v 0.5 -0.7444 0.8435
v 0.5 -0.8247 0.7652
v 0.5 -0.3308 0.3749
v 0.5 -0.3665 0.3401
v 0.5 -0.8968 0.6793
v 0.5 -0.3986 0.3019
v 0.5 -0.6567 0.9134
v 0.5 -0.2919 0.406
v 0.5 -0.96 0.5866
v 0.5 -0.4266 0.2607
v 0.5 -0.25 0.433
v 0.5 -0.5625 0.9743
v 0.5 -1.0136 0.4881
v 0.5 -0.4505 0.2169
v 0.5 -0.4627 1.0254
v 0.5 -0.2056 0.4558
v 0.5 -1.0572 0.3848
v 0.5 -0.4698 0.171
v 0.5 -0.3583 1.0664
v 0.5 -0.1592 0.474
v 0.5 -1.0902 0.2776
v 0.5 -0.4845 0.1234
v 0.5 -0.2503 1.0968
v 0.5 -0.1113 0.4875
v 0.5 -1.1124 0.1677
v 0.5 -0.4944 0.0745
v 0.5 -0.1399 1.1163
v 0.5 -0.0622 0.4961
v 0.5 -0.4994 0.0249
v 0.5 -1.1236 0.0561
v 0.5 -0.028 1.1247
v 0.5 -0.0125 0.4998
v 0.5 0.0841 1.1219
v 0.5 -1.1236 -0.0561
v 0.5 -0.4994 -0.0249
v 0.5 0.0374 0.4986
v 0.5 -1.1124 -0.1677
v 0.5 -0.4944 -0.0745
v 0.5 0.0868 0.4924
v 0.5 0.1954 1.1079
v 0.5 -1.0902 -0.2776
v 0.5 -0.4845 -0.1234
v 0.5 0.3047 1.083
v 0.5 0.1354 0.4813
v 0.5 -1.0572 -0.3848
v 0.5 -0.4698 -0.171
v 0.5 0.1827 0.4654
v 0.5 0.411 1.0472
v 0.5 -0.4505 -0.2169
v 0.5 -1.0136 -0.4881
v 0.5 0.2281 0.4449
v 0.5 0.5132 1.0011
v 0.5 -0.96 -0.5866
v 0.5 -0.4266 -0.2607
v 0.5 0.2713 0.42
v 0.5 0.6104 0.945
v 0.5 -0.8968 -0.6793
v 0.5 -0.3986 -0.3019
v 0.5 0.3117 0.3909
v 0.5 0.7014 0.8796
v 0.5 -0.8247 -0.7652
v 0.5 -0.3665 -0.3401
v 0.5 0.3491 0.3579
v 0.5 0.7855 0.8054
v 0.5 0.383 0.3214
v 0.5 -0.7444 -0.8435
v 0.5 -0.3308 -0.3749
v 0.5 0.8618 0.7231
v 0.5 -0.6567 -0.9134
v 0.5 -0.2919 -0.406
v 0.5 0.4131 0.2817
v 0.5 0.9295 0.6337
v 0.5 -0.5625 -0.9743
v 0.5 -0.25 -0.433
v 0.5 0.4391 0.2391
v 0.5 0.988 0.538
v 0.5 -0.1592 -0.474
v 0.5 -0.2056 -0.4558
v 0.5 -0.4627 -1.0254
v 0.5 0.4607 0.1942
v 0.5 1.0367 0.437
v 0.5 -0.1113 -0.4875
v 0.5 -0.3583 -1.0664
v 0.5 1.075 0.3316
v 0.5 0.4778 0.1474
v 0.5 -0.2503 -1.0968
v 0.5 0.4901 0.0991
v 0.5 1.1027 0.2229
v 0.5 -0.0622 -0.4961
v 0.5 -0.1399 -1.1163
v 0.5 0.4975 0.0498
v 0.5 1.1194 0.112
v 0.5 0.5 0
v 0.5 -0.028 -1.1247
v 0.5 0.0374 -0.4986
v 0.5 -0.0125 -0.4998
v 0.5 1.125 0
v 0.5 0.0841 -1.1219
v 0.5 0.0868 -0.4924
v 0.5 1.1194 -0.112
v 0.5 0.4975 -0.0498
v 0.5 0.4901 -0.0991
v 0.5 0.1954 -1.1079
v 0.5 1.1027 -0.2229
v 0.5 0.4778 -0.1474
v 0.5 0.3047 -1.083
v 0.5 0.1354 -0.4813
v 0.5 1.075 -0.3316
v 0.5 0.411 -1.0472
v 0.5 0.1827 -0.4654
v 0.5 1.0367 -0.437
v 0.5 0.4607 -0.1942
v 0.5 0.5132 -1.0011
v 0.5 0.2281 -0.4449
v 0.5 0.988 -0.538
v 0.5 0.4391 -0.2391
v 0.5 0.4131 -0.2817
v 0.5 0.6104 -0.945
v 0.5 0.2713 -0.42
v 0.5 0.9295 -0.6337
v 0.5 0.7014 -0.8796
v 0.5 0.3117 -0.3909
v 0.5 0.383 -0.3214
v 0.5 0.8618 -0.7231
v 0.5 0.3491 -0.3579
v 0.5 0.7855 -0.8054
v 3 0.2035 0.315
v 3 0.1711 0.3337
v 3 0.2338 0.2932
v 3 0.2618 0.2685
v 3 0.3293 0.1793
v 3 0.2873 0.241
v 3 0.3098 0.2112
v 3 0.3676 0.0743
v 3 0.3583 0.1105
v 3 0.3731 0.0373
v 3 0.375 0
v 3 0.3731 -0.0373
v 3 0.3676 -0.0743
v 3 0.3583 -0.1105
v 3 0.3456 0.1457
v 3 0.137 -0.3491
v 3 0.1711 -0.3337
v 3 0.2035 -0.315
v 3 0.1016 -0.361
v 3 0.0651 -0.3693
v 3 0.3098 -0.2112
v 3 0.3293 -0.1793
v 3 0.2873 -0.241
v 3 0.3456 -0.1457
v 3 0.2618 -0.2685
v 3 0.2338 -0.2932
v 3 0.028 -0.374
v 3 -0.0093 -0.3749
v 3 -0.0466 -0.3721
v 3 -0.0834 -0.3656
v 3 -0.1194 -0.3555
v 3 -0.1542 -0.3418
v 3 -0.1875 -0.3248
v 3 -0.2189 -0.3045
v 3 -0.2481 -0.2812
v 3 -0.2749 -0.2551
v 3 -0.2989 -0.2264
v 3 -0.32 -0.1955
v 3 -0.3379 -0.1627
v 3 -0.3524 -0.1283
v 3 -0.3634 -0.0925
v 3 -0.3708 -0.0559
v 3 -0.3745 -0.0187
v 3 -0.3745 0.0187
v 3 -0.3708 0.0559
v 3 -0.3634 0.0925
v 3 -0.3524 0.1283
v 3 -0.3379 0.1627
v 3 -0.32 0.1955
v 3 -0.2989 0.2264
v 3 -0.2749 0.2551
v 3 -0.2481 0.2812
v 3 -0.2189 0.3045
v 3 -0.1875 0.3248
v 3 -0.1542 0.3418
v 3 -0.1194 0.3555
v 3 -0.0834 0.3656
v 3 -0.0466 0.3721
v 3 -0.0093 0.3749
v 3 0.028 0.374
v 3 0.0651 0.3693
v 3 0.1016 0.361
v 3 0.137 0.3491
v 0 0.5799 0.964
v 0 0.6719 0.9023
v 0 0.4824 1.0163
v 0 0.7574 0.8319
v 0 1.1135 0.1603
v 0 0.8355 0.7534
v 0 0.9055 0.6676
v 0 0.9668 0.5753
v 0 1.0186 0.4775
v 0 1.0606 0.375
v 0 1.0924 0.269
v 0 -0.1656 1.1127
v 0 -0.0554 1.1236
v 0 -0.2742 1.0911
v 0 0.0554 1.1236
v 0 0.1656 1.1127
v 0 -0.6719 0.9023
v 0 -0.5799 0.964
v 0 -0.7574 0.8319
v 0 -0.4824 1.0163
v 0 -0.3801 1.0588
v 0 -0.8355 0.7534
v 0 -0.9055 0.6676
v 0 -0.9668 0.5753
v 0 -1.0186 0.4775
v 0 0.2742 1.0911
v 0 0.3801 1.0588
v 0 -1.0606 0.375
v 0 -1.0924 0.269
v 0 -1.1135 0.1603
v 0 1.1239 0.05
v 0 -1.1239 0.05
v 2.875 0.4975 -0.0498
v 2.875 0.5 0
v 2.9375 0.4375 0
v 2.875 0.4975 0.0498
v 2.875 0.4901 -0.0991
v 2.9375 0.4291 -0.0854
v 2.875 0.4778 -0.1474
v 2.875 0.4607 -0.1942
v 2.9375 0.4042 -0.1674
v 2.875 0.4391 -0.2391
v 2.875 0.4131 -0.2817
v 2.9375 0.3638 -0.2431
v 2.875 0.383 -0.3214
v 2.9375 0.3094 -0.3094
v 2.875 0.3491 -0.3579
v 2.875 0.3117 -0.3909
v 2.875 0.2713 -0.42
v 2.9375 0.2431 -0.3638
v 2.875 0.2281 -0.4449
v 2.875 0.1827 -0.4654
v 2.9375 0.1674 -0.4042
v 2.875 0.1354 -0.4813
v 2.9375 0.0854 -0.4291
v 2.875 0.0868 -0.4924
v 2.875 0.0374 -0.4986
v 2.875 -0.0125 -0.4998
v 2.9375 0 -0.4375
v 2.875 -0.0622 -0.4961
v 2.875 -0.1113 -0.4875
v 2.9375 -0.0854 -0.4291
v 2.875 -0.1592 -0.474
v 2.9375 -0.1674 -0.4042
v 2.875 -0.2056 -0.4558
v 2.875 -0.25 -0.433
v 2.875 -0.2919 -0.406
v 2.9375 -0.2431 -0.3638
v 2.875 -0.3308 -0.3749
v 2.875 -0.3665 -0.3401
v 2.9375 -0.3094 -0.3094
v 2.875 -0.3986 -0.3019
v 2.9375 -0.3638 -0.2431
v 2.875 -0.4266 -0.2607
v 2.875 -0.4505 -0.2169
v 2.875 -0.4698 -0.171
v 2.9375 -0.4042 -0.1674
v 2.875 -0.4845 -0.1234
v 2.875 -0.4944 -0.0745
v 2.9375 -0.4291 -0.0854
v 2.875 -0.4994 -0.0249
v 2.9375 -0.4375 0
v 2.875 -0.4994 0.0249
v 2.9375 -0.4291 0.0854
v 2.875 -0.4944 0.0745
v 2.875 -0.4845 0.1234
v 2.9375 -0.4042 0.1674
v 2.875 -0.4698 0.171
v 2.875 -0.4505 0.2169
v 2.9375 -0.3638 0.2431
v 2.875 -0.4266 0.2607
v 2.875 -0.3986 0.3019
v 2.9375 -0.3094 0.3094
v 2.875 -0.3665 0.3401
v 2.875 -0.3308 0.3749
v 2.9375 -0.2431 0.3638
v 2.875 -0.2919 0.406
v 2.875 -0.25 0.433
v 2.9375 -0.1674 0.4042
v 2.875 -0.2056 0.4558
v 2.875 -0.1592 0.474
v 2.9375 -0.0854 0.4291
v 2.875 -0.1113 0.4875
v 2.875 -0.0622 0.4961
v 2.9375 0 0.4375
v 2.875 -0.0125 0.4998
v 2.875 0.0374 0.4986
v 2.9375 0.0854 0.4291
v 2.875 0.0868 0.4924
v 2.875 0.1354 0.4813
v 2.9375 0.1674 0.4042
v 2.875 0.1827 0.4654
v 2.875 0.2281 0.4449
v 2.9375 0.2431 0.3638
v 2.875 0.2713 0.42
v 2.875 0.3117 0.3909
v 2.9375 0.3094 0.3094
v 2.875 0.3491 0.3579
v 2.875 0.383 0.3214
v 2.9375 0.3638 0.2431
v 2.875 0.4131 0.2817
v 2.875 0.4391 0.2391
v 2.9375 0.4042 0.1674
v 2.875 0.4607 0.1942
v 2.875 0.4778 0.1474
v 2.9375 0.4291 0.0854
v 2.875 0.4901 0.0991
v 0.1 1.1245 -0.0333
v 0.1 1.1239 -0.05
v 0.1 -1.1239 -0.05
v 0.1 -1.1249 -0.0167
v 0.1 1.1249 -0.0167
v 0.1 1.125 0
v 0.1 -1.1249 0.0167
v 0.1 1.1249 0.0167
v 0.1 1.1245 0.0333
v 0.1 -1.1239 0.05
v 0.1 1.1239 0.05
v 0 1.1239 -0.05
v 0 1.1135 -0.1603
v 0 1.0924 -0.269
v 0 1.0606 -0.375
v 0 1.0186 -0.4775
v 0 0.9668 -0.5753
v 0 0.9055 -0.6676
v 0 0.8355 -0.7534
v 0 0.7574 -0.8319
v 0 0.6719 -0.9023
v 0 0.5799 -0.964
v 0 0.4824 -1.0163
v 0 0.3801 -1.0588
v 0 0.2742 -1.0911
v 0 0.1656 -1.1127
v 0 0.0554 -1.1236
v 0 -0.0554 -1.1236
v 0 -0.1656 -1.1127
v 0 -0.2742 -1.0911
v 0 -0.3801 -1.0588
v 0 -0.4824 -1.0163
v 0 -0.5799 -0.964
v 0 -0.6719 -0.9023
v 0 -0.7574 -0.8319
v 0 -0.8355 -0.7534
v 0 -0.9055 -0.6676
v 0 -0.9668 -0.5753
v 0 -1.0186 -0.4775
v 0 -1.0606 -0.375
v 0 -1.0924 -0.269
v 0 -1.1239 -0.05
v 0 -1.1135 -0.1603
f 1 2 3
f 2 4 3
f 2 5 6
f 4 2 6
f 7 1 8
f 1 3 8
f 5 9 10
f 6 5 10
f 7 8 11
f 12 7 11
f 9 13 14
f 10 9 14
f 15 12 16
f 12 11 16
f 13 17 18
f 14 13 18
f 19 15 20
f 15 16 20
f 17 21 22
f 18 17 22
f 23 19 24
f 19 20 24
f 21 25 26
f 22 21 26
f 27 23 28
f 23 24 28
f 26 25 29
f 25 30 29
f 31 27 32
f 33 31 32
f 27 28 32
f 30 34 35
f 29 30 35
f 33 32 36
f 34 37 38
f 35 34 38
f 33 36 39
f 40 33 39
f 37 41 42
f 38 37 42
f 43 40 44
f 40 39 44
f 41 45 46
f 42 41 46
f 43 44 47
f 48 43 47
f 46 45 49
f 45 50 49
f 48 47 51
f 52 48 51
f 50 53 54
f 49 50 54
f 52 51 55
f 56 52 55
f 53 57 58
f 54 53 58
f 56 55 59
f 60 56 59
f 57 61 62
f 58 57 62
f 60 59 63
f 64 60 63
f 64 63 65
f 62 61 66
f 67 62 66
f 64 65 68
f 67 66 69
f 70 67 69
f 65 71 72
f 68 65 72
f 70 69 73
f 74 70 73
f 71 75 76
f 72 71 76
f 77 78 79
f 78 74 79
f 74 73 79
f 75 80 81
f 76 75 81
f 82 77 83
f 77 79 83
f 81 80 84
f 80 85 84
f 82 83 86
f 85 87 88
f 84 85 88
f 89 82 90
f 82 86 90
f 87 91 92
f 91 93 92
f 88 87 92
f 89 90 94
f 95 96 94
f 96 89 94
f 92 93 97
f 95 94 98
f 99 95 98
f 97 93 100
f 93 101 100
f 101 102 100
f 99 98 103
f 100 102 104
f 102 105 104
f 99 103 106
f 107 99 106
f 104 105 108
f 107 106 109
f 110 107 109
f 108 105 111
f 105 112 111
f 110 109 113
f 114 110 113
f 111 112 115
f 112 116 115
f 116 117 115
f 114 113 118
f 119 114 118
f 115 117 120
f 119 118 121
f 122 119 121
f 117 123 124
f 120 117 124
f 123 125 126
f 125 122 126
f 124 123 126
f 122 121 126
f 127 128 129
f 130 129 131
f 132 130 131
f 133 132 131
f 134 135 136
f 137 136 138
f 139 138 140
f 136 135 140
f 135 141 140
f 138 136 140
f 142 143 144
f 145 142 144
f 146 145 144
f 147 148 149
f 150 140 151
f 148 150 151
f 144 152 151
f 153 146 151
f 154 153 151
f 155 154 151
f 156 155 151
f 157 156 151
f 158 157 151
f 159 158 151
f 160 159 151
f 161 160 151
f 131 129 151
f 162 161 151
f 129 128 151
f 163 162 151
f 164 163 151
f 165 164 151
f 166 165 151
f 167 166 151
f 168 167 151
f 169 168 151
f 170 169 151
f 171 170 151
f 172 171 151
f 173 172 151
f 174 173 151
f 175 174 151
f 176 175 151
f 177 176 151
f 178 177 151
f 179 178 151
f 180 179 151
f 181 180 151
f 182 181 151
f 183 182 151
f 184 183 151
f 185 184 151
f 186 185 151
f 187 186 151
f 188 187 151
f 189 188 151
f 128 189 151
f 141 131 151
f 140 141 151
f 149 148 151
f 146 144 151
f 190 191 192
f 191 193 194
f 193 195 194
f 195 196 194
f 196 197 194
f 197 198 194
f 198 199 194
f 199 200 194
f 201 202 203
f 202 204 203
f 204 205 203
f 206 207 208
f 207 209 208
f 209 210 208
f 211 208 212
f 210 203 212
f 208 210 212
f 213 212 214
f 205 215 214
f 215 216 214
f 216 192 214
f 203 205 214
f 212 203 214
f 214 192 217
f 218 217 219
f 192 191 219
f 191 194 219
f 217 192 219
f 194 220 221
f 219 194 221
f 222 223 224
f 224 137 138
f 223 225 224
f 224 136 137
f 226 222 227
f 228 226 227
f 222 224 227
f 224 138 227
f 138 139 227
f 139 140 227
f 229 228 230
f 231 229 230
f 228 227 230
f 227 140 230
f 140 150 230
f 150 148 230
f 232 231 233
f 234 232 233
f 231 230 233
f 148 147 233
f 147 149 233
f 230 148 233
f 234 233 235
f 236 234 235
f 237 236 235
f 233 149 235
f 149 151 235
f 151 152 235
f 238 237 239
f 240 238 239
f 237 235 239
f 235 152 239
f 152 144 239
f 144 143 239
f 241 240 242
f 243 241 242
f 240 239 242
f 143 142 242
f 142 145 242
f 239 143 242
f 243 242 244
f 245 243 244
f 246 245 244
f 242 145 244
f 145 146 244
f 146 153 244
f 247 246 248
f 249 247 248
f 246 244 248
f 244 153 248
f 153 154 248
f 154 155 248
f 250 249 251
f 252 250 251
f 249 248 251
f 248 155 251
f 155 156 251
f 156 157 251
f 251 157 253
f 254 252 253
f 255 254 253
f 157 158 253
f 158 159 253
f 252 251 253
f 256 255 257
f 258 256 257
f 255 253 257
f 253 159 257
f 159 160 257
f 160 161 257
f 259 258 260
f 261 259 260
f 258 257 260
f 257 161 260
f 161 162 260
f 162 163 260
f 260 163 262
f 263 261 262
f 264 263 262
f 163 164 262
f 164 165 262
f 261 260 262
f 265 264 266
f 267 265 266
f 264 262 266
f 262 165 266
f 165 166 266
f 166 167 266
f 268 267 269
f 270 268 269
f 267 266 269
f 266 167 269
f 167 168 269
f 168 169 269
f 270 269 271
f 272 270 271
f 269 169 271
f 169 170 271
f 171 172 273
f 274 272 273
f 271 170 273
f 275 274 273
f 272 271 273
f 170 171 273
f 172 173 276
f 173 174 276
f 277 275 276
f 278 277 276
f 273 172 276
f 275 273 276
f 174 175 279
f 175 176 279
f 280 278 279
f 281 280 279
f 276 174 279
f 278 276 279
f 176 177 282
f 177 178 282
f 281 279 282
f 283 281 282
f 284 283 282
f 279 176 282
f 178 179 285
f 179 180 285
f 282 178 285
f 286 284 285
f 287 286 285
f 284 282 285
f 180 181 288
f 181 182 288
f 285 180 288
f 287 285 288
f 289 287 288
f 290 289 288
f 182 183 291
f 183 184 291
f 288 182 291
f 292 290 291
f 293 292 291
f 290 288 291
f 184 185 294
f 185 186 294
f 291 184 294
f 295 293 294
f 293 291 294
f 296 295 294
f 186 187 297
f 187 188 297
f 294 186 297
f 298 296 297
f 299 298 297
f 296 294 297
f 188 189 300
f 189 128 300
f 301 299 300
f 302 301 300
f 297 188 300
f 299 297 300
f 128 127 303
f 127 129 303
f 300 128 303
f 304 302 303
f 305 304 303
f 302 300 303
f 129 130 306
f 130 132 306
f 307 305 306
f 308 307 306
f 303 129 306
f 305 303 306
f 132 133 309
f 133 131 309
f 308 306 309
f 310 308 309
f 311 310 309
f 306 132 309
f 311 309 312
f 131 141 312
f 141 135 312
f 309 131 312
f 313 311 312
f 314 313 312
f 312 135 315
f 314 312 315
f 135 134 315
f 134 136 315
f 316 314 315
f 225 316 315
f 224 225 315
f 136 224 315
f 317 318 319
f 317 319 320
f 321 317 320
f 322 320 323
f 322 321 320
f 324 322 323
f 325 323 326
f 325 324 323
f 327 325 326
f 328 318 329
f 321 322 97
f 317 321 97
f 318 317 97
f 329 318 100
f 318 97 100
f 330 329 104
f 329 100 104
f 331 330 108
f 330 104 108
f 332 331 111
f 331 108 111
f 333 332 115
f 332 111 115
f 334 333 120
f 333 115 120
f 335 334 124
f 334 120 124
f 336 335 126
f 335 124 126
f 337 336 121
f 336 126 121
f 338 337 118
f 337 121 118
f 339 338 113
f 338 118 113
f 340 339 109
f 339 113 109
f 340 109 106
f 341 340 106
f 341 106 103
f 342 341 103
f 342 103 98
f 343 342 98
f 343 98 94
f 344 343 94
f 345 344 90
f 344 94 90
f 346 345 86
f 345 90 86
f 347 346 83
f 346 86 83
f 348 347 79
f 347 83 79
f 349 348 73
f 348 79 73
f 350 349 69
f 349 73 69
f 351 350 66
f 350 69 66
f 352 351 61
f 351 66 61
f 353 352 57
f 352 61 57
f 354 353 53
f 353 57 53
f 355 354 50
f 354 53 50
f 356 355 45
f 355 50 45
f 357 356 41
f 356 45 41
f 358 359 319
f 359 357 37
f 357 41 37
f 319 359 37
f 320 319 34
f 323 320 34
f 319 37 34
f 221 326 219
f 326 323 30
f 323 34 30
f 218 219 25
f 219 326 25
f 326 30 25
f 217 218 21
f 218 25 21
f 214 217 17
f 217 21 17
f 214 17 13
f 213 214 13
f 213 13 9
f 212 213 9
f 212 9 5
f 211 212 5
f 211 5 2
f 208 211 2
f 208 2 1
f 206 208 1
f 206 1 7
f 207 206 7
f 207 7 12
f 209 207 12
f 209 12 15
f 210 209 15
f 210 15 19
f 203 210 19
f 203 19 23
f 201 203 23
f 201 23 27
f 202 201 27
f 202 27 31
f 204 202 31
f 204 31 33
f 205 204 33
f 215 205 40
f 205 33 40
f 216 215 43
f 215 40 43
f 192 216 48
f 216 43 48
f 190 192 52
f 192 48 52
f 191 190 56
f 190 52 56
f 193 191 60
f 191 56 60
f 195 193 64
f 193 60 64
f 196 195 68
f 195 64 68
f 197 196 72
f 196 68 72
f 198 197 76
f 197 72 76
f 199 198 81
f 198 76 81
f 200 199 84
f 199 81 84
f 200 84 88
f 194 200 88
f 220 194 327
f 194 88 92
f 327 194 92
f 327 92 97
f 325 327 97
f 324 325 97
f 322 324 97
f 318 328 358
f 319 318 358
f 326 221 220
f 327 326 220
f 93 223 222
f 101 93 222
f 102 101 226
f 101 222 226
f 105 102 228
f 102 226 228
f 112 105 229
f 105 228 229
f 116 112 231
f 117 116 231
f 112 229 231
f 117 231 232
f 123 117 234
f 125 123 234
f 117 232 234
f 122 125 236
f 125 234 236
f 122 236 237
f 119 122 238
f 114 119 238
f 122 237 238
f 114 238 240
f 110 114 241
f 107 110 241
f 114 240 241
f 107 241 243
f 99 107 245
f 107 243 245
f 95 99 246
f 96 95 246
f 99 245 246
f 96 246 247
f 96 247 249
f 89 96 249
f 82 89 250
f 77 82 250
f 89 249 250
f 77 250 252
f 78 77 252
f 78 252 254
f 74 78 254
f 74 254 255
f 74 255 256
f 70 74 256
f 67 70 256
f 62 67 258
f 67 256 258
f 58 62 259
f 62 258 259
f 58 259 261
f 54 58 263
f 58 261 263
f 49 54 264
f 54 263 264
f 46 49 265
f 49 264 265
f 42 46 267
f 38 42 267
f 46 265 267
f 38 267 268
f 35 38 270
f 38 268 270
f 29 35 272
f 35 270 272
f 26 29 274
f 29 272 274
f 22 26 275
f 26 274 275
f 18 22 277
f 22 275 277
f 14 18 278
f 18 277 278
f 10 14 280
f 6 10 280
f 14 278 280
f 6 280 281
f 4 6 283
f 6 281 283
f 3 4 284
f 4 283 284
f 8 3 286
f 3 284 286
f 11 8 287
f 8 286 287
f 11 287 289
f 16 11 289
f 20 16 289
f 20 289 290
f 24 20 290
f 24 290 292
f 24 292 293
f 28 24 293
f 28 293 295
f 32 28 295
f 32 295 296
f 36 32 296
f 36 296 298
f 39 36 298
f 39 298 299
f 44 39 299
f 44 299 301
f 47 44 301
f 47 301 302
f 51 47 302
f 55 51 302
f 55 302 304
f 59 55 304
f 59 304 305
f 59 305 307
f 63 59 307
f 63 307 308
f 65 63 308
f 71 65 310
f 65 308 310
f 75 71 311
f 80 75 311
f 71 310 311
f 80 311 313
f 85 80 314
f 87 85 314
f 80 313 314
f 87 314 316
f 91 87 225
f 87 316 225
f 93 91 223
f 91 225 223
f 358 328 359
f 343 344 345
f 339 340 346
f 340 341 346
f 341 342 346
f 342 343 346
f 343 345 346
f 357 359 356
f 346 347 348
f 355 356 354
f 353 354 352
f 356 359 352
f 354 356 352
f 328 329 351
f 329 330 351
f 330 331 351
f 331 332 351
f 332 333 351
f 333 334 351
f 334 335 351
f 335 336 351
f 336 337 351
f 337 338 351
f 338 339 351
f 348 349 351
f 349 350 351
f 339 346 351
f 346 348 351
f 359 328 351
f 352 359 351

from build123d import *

# Parameters (mm, degrees)
CHAFL_N1_SIZE         = 0.125
CORTAR_EXTRUIR2_DEPTH = 0.1


with BuildPart() as part:
    # Croquis1 → Revolución1 (revolve)
    with BuildSketch(Plane.XY):
        Polygon((0, 0), (0, 1.125), (0.5, 1.125), (0.5, 0.5), (3, 0.5), (3, 0), align=None)
    revolve(axis=Axis((3, 0, 0), (-1, 0, 0)))

    # Chaflán1
    chafl_n1_edges = [part.edges().sort_by_distance(p)[0] for p in [
        (3, -0.5, 0),
    ]]
    chamfer(chafl_n1_edges, length=CHAFL_N1_SIZE)

    # Croquis6 → Cortar-Extruir2 (cut)
    with BuildSketch(Plane.ZY):
        with BuildLine():
            Line((-0.05, 1.12388834), (-0.05, -1.12388834))
            ThreePointArc((-0.05, -1.12388834), (0, -1.125), (0.05, -1.12388834))
            Line((0.05, -1.12388834), (0.05, 1.12388834))
            ThreePointArc((0.05, 1.12388834), (0, 1.125), (-0.05, 1.12388834))
        make_face()
    extrude(amount=-CORTAR_EXTRUIR2_DEPTH, mode=Mode.SUBTRACT)


solid = part.part
